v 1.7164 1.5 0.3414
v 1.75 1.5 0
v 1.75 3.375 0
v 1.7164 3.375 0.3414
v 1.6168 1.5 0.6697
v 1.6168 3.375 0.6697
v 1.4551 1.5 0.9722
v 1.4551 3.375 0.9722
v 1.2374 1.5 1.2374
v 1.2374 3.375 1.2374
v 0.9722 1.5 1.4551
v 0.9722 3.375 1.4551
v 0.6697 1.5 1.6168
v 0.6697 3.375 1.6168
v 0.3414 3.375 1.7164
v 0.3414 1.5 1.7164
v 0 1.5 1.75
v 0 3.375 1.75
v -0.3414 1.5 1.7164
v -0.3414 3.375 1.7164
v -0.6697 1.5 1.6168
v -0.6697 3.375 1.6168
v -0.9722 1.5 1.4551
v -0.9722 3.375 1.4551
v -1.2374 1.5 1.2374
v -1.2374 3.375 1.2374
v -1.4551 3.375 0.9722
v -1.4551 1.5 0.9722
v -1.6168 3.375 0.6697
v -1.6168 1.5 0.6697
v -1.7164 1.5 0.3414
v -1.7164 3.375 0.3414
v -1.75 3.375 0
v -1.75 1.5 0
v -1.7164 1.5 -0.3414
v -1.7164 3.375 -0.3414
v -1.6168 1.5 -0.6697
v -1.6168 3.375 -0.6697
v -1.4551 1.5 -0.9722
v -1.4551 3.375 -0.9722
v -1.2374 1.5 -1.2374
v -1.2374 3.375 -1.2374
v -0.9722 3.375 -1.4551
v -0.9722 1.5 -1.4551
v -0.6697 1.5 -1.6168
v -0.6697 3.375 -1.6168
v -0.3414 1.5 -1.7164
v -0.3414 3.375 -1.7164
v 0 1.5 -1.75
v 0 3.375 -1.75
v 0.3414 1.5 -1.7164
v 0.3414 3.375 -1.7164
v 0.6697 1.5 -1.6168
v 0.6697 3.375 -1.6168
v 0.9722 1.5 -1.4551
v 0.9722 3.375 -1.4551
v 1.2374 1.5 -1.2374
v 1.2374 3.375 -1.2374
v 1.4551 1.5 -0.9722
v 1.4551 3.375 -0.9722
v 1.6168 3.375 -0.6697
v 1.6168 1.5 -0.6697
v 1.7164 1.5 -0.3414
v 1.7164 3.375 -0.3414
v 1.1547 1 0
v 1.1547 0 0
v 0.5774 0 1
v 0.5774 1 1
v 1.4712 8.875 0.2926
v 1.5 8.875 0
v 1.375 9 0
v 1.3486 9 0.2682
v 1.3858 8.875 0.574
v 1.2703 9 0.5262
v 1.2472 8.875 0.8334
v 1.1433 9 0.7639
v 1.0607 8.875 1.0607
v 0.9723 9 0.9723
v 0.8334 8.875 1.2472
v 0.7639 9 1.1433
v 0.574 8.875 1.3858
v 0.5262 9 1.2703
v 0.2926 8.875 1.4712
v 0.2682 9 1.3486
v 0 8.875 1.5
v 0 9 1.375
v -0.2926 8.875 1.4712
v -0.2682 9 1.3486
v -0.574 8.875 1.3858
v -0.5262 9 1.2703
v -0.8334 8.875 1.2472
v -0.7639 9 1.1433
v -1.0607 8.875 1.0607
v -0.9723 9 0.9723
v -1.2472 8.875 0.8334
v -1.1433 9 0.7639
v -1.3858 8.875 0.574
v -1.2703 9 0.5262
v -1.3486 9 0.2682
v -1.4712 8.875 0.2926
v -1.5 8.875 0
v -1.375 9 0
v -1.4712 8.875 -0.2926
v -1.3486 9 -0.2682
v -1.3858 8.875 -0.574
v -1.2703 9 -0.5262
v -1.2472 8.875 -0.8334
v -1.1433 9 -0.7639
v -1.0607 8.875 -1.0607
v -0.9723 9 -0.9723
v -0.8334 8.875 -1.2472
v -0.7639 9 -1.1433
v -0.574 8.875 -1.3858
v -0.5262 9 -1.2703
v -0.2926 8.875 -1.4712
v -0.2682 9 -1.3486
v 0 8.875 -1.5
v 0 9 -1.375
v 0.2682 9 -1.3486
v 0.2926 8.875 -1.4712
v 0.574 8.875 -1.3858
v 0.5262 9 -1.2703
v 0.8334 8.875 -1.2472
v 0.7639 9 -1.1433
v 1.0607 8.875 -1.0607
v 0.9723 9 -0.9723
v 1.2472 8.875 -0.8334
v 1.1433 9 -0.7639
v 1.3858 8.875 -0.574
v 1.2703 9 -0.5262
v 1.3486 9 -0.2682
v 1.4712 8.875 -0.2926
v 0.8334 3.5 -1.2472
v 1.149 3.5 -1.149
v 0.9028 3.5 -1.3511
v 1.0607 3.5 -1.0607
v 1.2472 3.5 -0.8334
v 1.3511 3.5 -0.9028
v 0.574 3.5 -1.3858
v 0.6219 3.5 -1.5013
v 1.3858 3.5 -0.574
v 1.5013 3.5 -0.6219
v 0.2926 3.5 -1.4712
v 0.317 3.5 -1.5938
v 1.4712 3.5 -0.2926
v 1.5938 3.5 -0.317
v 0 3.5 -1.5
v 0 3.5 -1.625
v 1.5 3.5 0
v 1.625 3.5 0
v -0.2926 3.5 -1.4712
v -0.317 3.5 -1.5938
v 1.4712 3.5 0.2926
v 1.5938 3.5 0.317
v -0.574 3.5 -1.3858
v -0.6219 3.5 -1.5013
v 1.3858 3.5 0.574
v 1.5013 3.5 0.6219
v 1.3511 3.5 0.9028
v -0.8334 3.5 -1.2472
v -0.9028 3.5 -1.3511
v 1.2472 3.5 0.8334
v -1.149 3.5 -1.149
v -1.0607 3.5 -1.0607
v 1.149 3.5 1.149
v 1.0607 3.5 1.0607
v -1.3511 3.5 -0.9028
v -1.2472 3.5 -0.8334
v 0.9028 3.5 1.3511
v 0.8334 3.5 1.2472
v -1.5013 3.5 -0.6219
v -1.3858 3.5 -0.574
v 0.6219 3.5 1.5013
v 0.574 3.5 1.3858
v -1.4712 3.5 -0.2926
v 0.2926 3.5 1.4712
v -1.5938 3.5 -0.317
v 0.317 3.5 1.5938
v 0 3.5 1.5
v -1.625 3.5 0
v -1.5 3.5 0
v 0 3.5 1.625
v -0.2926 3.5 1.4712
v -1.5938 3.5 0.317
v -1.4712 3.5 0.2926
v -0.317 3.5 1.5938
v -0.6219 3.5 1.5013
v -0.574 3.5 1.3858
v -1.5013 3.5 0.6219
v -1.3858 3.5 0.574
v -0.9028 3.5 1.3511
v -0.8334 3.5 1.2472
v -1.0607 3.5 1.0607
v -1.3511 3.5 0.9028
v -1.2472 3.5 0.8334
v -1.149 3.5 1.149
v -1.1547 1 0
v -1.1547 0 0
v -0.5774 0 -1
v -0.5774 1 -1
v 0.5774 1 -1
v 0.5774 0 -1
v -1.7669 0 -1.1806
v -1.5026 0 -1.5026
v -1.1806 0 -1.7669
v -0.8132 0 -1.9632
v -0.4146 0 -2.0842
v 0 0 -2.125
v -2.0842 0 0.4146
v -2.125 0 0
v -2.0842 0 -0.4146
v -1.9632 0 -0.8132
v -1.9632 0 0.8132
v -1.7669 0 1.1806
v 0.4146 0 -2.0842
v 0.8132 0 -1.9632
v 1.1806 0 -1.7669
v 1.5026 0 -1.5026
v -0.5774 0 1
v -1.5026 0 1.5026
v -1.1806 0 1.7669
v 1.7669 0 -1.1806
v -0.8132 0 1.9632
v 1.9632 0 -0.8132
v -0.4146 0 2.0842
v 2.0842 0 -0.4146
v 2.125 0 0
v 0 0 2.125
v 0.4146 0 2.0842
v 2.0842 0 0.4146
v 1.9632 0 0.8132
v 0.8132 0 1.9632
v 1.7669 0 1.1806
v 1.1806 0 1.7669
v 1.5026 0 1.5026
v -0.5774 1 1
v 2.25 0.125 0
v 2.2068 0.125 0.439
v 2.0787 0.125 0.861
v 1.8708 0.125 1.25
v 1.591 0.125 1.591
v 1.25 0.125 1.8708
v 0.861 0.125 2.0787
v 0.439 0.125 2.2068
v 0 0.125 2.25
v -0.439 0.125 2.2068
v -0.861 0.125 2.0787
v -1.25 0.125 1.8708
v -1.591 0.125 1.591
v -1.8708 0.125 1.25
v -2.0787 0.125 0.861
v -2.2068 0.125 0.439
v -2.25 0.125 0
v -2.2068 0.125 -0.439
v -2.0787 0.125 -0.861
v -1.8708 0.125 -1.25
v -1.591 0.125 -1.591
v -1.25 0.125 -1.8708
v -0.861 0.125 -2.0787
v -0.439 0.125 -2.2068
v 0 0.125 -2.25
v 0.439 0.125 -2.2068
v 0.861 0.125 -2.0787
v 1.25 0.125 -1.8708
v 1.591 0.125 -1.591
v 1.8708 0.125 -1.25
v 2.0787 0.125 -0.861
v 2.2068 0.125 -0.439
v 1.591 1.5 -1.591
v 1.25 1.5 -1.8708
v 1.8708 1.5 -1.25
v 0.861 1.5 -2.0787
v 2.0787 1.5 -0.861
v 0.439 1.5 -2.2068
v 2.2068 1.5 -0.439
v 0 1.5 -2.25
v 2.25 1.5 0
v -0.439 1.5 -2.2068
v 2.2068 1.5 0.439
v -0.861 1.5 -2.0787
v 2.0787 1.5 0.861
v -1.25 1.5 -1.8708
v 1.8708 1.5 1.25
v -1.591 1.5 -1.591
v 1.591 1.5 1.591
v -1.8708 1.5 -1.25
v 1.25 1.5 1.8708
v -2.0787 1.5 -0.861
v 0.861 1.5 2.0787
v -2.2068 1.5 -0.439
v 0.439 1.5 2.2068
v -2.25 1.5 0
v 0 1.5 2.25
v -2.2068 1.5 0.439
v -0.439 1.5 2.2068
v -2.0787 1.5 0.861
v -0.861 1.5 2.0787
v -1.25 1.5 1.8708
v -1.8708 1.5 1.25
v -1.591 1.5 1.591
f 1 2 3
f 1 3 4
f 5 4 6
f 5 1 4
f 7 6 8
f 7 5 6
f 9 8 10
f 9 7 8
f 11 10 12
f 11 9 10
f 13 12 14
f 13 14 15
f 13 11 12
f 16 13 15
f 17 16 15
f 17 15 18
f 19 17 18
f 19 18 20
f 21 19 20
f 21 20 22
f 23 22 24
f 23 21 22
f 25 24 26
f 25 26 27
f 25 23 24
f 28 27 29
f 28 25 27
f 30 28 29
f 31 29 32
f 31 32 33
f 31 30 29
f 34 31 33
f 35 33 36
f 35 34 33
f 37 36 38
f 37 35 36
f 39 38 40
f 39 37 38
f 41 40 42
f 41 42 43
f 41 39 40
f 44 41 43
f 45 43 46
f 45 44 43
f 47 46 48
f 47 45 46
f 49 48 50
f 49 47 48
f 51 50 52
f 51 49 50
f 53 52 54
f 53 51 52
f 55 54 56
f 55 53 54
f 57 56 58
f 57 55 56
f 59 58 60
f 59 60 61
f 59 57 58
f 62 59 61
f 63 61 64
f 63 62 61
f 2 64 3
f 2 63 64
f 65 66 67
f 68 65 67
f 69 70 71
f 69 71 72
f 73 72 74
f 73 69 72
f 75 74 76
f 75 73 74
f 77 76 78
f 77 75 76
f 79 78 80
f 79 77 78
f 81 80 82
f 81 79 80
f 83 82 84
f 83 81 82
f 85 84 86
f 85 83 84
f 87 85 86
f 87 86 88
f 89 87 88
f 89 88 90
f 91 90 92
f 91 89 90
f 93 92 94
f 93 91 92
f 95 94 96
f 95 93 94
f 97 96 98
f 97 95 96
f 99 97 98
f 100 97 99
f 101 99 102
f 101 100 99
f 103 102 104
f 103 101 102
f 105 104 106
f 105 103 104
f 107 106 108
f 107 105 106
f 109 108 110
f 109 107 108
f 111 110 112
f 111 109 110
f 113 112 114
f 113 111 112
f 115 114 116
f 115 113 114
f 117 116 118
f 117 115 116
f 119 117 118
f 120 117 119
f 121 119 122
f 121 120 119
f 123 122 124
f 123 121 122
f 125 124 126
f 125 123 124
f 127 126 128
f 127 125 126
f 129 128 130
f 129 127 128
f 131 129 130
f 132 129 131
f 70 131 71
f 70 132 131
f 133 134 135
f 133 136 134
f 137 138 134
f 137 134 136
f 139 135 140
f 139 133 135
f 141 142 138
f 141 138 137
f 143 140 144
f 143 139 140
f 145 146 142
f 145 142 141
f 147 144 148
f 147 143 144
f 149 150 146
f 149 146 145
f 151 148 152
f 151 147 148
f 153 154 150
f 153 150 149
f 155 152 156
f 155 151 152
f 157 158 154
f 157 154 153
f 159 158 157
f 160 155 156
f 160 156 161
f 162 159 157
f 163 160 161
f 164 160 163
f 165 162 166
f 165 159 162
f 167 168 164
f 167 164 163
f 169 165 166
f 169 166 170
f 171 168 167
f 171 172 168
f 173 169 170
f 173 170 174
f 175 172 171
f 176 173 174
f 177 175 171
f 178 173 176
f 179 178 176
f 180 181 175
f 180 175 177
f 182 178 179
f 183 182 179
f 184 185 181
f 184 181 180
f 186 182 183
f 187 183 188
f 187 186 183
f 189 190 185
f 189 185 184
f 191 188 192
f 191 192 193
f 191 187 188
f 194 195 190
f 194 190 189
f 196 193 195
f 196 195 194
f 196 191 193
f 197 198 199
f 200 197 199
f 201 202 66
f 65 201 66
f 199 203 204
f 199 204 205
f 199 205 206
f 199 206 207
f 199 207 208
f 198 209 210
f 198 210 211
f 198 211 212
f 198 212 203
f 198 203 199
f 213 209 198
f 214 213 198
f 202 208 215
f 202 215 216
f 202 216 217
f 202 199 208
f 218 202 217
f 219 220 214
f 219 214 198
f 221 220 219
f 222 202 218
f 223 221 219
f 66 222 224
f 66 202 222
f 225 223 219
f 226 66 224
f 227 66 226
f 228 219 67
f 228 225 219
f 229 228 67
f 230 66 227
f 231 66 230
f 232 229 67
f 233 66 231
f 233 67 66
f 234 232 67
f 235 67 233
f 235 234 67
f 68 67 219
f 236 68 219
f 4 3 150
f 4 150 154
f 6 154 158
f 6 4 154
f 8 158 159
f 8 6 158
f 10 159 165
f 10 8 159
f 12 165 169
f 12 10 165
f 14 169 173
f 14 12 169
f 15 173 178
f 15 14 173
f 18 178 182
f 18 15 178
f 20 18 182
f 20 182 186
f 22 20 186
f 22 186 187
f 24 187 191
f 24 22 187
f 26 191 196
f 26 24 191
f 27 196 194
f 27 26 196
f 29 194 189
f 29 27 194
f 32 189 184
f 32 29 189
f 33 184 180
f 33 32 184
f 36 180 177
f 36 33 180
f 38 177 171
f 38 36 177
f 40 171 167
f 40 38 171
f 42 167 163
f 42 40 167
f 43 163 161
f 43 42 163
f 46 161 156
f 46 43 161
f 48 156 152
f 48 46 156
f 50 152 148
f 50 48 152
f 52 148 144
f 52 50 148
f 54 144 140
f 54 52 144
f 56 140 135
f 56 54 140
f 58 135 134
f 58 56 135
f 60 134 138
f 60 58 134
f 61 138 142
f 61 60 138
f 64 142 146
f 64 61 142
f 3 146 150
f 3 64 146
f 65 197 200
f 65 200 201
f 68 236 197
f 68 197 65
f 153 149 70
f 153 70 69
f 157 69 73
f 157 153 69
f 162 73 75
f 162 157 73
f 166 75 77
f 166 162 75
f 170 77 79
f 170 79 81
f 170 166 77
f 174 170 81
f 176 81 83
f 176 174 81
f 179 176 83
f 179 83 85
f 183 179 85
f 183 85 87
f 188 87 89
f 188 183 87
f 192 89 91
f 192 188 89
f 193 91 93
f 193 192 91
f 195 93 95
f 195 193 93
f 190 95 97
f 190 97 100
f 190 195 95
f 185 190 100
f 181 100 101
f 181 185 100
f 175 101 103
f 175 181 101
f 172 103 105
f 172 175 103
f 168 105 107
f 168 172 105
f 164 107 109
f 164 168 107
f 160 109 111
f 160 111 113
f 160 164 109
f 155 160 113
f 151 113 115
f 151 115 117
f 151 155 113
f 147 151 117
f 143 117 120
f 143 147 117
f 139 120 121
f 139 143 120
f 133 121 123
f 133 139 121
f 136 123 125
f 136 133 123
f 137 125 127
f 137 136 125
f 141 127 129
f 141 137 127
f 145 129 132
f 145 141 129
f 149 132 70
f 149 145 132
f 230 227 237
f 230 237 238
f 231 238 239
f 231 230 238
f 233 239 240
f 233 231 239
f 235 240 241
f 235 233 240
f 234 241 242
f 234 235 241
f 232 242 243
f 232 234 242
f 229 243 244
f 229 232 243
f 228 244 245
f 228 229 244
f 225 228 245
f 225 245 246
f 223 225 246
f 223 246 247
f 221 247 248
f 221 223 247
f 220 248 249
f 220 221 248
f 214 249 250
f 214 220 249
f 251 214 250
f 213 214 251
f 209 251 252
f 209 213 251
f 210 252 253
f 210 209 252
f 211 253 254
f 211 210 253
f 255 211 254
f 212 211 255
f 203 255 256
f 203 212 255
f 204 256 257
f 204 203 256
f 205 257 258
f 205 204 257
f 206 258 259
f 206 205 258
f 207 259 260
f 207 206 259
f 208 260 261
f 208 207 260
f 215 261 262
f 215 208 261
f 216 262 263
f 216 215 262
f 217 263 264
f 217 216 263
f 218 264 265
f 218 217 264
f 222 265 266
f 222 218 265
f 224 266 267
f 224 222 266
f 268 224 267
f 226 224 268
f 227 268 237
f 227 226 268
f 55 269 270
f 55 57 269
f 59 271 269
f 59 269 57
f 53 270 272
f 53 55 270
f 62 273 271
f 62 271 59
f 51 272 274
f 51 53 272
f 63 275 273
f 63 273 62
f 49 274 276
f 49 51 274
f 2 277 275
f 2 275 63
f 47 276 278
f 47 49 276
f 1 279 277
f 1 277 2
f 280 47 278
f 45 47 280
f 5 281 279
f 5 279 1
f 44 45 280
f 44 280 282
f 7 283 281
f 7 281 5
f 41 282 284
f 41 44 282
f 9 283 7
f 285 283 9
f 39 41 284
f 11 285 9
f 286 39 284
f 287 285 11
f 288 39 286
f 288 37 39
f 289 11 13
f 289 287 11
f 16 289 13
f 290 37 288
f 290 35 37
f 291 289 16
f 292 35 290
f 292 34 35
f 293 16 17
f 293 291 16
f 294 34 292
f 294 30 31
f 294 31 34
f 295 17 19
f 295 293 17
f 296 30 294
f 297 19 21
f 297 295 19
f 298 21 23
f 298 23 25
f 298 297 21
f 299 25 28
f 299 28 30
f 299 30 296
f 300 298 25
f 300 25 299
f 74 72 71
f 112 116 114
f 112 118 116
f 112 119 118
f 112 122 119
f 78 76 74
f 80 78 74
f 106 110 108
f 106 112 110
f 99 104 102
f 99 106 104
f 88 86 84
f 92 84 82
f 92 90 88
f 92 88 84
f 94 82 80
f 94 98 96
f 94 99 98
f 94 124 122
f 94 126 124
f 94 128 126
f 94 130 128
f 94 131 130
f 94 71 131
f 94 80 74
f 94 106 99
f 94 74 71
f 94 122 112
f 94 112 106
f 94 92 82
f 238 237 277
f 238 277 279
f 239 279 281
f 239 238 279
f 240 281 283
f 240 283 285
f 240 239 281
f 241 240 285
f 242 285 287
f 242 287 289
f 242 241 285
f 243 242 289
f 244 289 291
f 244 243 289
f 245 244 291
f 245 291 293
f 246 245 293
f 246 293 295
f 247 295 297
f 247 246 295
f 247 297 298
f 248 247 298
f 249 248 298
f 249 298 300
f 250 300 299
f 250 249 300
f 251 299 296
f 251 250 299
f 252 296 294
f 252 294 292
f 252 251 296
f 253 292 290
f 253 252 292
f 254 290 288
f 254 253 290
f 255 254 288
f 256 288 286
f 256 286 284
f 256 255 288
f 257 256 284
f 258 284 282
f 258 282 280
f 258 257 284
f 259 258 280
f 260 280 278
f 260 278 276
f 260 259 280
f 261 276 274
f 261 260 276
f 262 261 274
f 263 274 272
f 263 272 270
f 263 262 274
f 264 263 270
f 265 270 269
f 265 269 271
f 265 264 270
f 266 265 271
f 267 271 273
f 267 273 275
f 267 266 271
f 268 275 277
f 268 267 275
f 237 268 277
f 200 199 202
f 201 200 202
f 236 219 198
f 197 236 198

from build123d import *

# Parameters (mm, degrees)
CUT_EXTRUDE1_DEPTH = 1
CHAMFER1_SIZE      = 0.125


with BuildPart() as part:
    # Sketch1 → Revolve1 (revolve)
    with BuildSketch(Plane.XY):
        Polygon((0, 0), (0, 9), (1.5, 9), (1.5, 3.5), (1.75, 3.5), (1.75, 1.5), (2.25, 1.5), (2.25, 0), align=None)
    revolve(axis=Axis((0, 0, 0), (0, -1, 0)))

    # Sketch2 → Cut-Extrude1 (cut)
    with BuildSketch(Plane.XZ):
        Polygon((1.154700538, 0), (0.577350269, 1), (-0.577350269, 1), (-1.154700538, 0), (-0.577350269, -1), (0.577350269, -1), align=None)
    extrude(amount=-CUT_EXTRUDE1_DEPTH, mode=Mode.SUBTRACT)

    # Chamfer1
    chamfer1_edges = [part.edges().sort_by_distance(p)[0] for p in [
        (-2.25, 0, 0),
        (-1.75, 3.5, 0),
        (-1.5, 9, 0),
    ]]
    chamfer(chamfer1_edges, length=CHAMFER1_SIZE)


solid = part.part
